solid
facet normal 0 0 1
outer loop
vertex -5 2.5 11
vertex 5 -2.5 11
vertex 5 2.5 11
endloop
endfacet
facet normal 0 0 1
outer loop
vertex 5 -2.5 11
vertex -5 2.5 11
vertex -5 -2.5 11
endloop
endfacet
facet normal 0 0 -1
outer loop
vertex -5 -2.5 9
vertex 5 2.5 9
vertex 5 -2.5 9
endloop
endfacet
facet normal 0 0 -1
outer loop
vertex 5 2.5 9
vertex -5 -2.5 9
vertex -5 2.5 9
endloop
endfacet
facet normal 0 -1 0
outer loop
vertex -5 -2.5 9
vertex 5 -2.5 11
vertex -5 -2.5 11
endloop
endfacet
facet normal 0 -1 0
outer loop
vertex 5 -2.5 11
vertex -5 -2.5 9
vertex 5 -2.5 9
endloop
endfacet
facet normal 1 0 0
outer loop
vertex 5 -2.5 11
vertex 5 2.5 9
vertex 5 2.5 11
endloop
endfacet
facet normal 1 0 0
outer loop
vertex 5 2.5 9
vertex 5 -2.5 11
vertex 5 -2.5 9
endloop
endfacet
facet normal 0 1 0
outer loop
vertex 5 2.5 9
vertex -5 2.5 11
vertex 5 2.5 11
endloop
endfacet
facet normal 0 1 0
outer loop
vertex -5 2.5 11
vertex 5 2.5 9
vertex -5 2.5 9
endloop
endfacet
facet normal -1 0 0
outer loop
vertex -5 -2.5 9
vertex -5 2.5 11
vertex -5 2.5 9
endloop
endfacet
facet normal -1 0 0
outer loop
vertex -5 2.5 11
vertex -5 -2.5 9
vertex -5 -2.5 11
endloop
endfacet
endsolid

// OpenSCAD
Wood_size = 20; // [10:Small,20:Medium,30:Large]

Wood_length = 10;
Wood_height = 5;

// How many fingers do you want for articulation?
Number_of_fingers = 5; // [2:10]

// How thick should the wood be?
Wood_thickness = 2; // [1:5]

difference() {
  union() {
    translate([0, 0, Wood_size/2]) cube([Wood_length,Wood_height,Wood_thickness], center=true);
} }          
        
